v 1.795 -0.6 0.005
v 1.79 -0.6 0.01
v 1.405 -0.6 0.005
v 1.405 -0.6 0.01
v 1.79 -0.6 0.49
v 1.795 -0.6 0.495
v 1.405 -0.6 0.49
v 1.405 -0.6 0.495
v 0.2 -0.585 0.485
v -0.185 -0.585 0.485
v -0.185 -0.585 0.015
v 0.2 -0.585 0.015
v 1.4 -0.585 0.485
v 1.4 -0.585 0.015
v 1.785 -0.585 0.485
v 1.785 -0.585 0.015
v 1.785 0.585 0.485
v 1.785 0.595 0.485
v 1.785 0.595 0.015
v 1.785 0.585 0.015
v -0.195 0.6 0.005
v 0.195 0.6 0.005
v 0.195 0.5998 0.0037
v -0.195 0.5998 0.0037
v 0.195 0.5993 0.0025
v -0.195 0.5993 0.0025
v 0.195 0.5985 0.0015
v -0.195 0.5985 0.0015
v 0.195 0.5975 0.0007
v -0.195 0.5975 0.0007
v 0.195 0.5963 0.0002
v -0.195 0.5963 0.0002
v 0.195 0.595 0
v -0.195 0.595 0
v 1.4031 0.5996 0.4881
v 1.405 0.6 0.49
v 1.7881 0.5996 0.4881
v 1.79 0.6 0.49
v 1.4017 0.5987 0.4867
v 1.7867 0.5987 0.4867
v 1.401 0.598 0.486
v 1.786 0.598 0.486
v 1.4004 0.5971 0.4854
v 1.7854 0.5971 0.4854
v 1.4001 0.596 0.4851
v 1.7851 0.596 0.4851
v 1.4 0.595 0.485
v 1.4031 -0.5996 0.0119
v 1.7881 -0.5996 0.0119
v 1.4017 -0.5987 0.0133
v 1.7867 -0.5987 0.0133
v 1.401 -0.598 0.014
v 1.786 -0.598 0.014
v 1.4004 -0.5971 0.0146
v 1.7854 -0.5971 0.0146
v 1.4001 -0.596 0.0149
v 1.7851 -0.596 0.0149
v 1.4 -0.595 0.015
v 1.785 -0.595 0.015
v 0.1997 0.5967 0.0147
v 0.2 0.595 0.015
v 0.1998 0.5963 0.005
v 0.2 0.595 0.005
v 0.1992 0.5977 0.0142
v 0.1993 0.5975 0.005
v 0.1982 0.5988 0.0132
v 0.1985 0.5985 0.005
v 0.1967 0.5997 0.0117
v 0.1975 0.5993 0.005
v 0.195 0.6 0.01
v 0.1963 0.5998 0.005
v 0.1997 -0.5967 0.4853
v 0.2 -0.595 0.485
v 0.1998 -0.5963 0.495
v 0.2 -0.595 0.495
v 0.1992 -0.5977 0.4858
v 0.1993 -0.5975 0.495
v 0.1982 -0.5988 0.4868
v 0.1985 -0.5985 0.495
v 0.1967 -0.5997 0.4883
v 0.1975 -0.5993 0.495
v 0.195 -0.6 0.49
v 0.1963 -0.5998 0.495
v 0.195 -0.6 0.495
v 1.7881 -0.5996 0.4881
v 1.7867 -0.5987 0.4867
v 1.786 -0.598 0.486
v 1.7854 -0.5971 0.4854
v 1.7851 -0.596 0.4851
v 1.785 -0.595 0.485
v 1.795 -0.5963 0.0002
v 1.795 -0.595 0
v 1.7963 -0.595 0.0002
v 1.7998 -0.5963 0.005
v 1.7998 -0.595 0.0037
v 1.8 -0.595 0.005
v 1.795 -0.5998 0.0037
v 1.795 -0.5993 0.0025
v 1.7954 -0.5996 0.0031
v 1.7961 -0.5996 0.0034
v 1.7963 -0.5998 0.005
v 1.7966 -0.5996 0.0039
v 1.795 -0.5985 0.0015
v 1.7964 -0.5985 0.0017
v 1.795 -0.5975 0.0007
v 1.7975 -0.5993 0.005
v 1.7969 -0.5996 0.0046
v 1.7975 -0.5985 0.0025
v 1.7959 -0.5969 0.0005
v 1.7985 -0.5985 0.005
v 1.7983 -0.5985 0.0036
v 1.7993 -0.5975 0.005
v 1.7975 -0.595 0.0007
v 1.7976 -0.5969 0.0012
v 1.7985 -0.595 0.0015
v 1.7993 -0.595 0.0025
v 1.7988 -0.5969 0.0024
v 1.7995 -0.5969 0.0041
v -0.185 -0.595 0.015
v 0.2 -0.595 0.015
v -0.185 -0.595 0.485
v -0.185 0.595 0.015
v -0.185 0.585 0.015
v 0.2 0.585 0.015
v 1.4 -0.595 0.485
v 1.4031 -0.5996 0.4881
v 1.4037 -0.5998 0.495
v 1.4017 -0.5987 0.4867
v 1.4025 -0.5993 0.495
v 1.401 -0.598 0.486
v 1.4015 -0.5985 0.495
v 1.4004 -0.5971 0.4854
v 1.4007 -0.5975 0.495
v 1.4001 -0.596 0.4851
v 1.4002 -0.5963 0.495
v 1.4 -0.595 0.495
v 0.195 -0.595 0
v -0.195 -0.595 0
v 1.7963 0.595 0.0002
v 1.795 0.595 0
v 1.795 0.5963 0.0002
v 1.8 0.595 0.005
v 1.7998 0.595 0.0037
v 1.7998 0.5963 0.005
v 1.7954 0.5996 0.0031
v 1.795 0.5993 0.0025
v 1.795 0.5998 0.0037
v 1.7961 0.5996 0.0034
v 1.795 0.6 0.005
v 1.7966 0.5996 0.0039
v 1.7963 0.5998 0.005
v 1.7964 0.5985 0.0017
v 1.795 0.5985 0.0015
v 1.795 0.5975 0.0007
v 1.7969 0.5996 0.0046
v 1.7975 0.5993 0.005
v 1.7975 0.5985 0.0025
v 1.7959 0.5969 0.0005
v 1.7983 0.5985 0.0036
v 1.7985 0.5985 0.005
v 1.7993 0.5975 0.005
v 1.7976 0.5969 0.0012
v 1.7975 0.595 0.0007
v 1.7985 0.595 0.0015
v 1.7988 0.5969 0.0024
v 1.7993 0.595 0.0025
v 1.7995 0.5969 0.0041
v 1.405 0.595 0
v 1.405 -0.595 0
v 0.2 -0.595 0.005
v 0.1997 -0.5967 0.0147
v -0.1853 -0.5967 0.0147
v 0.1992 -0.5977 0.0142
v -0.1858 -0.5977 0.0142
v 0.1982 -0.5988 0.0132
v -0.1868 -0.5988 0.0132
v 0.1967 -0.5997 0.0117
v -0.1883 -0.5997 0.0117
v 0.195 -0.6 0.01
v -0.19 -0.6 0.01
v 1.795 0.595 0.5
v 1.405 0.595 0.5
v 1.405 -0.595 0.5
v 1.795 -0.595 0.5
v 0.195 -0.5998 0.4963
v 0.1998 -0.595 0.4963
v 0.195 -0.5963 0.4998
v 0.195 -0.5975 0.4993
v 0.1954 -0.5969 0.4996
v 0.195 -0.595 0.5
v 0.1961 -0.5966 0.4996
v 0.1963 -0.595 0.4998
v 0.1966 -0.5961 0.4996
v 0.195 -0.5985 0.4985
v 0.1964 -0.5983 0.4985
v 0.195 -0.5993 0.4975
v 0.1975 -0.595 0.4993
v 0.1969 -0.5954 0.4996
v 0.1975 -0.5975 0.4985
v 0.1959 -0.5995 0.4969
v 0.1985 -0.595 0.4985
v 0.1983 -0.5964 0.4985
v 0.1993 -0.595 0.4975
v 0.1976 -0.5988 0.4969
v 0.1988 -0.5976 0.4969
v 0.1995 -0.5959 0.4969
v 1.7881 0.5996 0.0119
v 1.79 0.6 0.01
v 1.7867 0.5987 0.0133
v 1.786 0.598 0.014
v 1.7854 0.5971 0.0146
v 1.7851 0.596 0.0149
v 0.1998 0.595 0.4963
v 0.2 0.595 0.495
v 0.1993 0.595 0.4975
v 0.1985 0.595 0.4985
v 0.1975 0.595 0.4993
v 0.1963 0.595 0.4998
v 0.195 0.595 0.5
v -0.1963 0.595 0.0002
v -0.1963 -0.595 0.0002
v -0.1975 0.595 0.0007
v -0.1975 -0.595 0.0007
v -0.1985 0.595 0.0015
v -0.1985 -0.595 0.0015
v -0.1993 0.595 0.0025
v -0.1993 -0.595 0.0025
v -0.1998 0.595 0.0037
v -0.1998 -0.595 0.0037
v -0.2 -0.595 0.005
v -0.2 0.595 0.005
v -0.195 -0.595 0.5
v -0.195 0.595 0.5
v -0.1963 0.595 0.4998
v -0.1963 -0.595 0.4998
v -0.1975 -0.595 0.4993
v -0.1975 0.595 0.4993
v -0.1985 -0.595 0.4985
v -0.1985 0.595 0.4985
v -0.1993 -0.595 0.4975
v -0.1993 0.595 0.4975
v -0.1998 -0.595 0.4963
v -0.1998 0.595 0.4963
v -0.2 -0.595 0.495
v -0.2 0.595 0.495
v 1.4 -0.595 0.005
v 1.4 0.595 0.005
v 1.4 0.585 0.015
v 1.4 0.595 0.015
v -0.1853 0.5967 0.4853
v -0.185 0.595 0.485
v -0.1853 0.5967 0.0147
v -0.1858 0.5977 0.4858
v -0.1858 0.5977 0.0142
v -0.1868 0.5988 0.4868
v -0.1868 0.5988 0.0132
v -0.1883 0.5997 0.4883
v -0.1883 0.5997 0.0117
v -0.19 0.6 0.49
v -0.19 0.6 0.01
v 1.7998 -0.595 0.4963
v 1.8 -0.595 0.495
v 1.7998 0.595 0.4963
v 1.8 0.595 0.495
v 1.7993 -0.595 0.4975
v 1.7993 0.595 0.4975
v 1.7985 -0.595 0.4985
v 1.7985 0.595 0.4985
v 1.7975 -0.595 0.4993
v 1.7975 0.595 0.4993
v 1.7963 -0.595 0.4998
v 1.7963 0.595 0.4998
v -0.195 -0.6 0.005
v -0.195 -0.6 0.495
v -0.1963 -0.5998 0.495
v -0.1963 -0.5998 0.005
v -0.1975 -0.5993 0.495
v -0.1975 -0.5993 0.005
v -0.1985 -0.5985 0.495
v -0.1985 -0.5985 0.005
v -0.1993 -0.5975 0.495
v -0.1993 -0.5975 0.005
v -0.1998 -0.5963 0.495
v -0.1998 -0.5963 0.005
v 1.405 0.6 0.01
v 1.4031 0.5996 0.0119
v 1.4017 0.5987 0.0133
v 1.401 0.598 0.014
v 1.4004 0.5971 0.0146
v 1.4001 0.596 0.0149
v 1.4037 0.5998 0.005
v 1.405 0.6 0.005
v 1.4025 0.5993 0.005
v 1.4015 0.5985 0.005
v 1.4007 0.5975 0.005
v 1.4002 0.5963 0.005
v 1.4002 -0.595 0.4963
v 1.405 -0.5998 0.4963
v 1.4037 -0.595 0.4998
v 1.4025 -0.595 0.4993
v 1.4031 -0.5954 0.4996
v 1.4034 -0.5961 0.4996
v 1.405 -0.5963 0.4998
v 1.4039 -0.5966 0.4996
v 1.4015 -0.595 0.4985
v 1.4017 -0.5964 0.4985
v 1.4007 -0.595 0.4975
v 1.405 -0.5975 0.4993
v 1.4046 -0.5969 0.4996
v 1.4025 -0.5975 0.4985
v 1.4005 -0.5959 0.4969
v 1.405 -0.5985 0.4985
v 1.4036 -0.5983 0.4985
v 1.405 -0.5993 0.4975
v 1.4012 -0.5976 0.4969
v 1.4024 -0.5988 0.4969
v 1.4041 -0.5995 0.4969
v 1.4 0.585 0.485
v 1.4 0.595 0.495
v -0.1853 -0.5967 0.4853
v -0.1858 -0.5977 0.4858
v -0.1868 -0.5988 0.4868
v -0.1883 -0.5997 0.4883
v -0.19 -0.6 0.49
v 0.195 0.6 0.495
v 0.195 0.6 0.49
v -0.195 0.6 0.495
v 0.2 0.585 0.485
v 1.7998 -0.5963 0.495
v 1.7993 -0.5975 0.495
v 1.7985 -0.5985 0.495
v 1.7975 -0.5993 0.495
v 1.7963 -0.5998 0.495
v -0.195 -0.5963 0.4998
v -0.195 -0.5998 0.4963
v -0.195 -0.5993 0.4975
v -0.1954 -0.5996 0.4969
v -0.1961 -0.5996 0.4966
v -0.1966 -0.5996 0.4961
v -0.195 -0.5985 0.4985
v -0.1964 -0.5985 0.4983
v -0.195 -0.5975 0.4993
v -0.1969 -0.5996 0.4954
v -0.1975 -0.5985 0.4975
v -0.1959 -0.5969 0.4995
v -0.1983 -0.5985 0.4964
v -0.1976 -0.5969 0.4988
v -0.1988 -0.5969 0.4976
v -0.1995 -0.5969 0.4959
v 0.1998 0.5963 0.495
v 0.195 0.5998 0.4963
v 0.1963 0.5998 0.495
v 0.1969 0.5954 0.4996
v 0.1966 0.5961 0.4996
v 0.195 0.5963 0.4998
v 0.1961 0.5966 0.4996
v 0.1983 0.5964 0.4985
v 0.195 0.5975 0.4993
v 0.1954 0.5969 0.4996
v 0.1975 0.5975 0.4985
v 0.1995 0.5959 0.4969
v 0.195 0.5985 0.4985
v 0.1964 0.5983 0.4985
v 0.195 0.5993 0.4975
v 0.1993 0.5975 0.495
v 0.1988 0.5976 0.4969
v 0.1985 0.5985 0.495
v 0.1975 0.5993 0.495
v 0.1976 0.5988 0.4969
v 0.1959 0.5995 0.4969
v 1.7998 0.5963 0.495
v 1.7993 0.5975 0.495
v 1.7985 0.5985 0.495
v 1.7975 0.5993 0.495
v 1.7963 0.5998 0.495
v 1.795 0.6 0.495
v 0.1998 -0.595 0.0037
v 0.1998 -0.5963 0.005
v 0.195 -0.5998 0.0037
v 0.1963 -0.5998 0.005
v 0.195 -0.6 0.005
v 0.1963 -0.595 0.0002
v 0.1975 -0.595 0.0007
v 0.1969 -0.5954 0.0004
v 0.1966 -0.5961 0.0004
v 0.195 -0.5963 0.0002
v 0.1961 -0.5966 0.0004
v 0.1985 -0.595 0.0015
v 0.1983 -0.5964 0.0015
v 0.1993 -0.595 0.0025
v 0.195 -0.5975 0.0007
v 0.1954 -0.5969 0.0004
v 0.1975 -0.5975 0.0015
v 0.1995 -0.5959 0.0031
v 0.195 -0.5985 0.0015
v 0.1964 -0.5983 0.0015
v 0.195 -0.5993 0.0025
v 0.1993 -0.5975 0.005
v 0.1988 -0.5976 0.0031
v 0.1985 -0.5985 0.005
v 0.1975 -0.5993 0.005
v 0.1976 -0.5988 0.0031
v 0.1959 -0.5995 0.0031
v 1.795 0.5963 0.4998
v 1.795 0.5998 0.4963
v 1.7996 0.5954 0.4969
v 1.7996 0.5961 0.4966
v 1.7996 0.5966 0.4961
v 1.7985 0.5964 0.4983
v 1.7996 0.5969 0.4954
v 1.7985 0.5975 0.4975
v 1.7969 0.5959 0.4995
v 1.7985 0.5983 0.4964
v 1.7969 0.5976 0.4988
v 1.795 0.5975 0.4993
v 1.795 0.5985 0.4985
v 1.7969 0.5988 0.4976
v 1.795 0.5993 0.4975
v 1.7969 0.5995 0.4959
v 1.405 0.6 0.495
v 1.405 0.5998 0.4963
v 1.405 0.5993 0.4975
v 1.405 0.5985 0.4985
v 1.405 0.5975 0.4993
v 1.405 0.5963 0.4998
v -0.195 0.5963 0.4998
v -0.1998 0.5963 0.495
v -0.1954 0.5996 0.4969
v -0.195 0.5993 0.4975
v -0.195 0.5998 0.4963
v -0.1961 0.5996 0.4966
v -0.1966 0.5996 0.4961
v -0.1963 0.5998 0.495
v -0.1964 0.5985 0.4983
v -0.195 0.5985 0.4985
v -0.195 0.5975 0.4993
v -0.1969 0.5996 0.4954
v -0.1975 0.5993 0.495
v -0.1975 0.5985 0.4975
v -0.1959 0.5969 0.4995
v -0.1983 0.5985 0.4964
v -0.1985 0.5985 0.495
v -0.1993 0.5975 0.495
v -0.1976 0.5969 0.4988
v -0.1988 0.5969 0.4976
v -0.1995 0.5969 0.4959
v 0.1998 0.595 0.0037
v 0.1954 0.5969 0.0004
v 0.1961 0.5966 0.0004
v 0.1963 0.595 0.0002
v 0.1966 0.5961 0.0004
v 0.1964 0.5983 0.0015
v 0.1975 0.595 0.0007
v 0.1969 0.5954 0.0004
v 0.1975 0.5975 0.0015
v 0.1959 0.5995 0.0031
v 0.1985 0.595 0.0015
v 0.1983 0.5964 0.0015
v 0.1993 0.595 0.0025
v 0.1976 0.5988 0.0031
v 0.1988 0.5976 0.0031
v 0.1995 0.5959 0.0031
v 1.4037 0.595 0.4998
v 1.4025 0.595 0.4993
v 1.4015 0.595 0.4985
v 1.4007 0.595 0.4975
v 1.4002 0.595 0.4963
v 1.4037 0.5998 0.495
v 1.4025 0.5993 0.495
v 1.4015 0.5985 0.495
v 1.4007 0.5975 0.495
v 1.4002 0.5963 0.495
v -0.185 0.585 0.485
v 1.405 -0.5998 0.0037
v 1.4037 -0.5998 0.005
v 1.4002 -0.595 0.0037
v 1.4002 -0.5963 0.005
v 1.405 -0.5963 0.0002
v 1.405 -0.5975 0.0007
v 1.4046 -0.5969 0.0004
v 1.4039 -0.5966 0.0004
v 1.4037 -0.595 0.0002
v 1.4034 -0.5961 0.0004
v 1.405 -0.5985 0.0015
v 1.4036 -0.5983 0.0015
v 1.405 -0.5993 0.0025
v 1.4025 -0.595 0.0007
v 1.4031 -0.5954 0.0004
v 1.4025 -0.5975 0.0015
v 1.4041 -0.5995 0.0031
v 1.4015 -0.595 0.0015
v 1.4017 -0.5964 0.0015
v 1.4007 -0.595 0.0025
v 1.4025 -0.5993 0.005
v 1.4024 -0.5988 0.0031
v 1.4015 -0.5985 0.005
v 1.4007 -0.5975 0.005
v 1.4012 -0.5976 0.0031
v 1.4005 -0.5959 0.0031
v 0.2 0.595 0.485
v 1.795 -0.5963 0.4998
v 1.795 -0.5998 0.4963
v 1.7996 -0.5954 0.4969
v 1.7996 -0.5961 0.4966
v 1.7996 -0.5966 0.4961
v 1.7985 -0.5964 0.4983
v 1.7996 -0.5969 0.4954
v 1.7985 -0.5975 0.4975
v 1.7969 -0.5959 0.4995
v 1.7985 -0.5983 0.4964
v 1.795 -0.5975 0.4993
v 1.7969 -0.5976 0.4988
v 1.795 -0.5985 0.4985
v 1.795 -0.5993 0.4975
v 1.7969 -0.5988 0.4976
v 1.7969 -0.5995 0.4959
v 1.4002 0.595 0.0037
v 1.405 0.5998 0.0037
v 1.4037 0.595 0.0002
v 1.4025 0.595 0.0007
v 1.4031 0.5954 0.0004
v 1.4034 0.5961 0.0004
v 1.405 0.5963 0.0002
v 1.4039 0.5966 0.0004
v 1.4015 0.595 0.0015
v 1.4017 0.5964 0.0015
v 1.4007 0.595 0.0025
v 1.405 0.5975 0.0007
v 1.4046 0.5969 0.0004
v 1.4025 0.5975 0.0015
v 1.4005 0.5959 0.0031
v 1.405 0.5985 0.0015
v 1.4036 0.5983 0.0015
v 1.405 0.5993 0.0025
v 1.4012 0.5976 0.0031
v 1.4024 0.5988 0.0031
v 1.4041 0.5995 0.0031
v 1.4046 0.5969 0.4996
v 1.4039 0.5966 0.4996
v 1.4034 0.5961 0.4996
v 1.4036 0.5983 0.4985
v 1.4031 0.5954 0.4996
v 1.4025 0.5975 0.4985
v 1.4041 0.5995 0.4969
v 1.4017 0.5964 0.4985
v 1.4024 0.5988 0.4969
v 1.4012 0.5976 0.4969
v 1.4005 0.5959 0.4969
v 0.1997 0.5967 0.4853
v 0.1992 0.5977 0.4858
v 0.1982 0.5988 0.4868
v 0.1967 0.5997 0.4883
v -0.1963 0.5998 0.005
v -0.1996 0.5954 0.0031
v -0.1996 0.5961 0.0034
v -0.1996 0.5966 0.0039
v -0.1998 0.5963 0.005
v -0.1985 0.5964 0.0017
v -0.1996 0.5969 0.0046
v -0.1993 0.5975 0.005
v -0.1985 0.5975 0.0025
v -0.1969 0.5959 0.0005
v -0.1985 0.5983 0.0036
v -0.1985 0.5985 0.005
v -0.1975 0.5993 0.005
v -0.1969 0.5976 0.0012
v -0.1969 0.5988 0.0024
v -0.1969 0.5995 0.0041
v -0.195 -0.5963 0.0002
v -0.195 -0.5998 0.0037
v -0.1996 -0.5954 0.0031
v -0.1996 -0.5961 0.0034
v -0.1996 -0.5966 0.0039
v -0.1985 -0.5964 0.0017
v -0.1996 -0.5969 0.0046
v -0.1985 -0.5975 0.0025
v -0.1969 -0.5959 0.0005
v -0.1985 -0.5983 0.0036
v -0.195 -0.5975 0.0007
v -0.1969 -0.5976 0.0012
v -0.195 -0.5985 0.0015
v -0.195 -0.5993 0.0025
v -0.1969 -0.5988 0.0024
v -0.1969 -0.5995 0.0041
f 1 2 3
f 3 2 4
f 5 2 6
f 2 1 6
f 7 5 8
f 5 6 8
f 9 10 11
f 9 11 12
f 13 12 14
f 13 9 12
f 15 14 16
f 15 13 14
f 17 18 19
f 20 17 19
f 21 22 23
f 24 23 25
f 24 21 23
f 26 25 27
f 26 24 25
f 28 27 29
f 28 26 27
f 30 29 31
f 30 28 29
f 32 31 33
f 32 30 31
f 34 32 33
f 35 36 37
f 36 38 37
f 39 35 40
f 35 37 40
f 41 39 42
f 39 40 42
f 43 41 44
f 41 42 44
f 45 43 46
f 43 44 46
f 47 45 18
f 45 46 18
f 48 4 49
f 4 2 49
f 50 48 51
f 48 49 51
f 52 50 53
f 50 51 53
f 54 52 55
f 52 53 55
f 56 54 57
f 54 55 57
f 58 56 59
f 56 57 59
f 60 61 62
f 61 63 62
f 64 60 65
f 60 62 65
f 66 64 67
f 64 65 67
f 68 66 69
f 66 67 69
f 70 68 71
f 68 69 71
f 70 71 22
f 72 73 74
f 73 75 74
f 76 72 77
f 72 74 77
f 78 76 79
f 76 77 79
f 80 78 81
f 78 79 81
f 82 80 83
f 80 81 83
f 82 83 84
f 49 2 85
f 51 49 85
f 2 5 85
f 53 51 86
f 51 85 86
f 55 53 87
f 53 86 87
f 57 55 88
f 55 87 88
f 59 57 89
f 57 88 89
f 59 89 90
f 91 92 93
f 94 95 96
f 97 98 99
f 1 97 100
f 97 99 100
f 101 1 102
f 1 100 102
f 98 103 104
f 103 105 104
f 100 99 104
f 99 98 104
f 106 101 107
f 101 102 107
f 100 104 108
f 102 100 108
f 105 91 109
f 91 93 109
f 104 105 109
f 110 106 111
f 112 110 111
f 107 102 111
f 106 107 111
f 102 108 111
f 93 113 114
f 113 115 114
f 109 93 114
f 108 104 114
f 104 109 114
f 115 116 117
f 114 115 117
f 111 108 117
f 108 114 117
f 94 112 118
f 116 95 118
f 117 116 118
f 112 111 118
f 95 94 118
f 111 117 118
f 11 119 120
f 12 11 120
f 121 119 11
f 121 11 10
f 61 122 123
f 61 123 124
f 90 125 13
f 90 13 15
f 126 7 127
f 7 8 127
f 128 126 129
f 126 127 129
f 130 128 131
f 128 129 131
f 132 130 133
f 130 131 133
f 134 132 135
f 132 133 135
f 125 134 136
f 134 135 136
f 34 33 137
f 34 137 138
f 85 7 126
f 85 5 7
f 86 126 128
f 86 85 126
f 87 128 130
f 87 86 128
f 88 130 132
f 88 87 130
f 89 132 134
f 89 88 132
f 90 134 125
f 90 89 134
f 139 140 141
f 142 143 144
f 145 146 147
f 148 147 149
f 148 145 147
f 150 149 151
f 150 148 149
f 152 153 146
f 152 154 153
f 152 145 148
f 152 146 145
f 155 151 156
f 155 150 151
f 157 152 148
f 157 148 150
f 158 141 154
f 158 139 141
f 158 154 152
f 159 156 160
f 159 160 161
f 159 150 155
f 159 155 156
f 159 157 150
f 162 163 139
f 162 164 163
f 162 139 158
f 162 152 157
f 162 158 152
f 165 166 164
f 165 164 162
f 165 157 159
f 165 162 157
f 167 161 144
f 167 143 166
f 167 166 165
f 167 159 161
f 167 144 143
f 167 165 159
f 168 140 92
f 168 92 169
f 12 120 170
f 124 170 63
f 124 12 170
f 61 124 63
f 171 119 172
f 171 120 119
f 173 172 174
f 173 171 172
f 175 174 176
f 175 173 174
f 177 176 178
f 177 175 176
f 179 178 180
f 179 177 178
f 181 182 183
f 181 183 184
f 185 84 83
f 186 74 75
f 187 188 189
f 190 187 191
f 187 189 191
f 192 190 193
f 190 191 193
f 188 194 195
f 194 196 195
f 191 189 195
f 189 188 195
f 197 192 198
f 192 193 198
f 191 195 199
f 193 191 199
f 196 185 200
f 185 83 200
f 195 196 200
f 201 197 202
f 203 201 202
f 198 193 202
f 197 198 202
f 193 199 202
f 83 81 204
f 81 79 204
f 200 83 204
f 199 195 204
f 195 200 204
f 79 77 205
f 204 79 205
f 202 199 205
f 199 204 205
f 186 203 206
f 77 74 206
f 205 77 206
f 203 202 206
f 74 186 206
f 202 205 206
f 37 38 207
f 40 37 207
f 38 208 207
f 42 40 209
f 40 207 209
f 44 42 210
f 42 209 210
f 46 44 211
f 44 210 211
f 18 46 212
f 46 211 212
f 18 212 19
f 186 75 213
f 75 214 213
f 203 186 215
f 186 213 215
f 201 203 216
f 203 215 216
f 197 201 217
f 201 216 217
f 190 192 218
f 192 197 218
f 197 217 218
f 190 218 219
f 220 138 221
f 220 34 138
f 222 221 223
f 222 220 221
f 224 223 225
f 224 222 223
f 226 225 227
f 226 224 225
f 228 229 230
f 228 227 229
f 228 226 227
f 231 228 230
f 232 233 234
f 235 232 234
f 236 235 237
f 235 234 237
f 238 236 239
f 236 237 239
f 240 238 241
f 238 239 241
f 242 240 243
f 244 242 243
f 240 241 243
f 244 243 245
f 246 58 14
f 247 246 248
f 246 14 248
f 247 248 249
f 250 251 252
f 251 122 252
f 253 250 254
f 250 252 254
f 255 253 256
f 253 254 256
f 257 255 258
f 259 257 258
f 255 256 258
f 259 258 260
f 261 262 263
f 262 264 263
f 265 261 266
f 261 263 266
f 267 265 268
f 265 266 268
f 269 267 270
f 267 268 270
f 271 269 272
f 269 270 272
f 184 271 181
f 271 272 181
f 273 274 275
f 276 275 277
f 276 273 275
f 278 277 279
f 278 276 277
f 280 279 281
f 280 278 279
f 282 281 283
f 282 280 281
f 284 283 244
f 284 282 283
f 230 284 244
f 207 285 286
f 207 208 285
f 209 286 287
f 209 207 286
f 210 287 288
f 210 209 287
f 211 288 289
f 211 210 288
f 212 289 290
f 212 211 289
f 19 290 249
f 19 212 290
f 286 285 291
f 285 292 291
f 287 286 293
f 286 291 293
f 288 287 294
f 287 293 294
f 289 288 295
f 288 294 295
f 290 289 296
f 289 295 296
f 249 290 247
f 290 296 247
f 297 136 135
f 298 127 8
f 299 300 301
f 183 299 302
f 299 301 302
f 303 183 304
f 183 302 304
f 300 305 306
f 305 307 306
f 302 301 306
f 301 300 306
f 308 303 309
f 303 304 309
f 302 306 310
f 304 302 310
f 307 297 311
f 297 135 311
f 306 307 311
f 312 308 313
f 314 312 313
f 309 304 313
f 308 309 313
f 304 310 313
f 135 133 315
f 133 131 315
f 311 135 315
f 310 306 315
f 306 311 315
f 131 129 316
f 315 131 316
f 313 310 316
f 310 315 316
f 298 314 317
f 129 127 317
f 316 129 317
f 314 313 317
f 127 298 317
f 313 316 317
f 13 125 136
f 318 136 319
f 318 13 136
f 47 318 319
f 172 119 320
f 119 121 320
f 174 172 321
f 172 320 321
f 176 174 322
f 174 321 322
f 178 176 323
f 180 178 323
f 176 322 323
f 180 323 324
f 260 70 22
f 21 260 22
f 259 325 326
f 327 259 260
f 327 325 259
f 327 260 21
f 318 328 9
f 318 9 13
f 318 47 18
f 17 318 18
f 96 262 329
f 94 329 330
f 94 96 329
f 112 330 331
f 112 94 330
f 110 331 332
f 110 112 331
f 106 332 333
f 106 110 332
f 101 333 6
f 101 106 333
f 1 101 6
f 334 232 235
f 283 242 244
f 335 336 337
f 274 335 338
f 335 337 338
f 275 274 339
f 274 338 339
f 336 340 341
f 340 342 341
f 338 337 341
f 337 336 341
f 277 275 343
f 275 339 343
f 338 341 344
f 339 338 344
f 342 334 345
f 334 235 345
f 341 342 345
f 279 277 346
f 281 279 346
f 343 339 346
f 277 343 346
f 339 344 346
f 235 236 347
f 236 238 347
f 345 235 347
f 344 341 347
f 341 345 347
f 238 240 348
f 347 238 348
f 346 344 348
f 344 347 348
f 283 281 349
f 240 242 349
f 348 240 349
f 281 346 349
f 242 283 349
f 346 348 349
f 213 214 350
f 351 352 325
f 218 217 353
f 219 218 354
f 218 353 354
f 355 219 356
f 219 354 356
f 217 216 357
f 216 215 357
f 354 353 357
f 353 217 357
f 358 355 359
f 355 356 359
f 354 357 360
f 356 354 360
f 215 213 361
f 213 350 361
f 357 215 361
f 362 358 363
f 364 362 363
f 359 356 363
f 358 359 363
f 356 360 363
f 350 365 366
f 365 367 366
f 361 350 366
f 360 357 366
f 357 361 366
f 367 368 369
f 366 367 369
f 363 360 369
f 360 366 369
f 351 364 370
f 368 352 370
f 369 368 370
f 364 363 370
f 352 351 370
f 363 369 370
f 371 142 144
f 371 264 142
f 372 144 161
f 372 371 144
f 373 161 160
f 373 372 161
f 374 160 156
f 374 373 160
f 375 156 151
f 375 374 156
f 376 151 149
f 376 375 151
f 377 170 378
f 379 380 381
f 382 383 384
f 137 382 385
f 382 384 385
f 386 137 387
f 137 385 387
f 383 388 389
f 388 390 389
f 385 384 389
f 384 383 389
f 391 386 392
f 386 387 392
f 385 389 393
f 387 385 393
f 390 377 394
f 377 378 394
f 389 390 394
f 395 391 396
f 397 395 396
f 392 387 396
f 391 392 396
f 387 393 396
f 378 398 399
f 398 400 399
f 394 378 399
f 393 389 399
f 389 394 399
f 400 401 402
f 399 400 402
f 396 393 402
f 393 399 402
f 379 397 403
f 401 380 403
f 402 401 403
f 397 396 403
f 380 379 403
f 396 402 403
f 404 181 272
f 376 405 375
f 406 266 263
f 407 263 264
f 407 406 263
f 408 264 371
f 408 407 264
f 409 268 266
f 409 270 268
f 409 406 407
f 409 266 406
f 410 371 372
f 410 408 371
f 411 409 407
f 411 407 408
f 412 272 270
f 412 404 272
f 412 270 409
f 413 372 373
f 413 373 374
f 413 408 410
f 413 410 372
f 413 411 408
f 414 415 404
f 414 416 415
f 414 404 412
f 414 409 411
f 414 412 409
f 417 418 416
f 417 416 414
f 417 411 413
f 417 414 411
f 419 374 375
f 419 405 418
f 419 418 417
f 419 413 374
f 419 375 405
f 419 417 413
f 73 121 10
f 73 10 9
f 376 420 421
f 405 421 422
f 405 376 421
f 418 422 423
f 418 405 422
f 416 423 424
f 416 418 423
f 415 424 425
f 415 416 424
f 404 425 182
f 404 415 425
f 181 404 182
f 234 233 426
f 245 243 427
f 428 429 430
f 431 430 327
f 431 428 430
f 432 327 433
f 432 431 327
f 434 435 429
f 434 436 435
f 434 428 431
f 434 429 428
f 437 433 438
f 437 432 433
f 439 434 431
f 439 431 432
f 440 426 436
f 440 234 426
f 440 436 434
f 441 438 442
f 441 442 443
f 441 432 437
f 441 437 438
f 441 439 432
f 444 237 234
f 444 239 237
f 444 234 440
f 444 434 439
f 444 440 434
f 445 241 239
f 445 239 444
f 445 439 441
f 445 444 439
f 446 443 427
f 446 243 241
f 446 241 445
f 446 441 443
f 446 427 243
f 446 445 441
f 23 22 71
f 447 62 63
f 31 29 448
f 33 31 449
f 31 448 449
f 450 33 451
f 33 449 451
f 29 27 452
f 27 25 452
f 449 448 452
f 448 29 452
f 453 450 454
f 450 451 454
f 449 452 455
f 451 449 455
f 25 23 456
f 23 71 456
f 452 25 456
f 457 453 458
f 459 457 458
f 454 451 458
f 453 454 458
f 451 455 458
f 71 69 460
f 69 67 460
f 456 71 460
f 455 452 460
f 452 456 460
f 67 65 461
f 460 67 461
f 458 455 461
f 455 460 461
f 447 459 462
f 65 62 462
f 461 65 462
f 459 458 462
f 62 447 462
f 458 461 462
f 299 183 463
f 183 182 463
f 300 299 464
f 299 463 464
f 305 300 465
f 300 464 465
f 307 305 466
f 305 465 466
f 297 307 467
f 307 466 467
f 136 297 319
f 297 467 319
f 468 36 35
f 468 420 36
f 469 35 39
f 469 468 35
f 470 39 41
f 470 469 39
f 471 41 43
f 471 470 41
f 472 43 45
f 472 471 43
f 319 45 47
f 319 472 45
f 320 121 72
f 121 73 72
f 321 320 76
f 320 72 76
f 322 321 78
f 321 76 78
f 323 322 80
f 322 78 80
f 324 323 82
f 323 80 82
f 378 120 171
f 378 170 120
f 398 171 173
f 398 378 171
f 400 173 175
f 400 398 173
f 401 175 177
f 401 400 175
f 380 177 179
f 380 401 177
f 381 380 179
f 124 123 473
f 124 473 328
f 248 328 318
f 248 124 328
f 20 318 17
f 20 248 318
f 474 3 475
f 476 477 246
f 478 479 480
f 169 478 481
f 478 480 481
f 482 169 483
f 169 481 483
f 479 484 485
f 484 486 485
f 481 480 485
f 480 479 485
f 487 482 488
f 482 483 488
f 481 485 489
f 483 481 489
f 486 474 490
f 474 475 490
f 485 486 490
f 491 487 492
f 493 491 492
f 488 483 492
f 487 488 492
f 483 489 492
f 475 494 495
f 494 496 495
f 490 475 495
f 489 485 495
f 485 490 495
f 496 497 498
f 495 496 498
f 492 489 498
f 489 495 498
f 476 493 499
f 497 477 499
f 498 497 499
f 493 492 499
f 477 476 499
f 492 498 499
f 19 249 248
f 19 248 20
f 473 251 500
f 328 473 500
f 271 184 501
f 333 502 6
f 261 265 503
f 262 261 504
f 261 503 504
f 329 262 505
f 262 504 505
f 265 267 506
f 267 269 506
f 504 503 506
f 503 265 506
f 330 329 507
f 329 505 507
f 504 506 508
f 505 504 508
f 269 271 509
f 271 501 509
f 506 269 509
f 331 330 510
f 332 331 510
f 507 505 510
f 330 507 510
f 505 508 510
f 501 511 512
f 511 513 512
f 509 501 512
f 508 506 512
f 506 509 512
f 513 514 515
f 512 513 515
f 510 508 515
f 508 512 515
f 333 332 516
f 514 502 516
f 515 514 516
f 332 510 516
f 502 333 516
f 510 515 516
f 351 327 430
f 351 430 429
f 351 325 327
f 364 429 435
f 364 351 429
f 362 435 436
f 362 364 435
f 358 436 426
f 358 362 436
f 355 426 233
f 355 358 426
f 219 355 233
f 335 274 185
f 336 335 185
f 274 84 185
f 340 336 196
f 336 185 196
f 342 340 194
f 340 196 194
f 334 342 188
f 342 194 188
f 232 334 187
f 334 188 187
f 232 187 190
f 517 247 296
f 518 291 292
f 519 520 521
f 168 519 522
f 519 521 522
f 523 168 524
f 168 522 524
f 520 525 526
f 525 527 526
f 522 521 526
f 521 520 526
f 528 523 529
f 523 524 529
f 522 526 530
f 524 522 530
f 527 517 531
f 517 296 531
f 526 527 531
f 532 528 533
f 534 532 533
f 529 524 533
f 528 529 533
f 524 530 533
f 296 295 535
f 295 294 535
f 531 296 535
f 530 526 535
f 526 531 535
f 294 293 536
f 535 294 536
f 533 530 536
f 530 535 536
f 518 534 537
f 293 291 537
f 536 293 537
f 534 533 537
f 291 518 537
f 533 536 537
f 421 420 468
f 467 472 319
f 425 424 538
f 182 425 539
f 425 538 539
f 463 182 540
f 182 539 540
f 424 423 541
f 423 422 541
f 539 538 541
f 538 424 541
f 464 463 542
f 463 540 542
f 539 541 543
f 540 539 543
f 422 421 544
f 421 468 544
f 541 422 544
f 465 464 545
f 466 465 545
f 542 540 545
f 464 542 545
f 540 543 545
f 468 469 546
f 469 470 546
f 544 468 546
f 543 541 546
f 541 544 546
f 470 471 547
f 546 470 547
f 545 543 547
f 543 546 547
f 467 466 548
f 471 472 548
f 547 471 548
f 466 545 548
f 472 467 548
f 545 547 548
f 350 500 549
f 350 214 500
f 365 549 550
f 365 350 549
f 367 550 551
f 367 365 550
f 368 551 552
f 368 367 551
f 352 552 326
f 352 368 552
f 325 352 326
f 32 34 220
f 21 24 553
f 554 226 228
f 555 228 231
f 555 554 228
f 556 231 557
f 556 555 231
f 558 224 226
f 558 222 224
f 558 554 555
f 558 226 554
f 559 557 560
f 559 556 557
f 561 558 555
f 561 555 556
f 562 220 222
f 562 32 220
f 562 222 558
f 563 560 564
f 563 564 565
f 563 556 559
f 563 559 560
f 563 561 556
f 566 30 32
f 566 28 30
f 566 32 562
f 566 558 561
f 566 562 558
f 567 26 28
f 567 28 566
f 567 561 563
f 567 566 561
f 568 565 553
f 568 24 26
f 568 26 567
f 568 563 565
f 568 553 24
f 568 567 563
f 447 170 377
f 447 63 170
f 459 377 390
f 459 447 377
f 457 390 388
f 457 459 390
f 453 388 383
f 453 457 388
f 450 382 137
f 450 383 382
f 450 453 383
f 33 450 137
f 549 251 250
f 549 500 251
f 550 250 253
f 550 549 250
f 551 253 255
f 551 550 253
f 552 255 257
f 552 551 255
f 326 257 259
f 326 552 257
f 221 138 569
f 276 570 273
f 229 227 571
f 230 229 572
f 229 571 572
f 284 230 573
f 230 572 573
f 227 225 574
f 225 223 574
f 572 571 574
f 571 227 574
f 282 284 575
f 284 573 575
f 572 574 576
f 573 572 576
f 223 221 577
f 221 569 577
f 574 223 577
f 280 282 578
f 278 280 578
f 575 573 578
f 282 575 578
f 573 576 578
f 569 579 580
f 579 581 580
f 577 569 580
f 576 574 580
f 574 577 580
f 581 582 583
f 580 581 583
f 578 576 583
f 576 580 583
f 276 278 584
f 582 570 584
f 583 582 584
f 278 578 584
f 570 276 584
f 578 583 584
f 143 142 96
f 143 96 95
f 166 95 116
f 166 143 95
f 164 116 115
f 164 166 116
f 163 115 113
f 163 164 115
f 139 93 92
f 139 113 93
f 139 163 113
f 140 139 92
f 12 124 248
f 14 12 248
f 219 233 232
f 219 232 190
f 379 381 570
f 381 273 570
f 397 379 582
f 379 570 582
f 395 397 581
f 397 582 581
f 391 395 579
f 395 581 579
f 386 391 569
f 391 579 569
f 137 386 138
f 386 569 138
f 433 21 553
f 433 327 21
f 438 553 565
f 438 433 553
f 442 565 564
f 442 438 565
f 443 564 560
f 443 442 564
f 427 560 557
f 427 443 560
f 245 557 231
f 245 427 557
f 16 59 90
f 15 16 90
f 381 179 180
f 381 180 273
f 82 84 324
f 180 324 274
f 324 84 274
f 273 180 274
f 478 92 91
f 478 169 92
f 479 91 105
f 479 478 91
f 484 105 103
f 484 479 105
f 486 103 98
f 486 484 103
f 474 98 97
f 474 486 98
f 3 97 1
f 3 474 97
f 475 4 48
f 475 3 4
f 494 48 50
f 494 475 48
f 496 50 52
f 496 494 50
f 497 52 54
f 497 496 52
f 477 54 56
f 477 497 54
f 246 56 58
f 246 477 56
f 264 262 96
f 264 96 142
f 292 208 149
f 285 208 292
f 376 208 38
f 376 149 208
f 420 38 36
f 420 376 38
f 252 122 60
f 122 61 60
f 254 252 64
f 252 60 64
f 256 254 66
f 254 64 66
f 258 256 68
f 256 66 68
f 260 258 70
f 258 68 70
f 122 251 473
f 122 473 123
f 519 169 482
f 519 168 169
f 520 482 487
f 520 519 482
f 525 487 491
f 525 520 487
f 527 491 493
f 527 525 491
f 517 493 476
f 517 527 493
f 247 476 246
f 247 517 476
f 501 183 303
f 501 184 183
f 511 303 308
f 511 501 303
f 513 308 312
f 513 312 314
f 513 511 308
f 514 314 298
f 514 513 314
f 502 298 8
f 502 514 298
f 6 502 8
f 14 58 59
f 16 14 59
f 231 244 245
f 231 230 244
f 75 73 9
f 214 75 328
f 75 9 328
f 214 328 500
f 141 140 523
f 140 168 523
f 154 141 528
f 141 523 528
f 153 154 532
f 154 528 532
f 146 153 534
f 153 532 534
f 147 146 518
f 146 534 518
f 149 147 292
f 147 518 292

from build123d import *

# Parameters (mm, degrees)
SKETCH_1_W          = 2
SKETCH_1_H          = 1.2
EXTRUDE_1_DEPTH     = 0.47
SKETCH_2_W          = 0.4
SKETCH_2_H          = 1.2
EXTRUDE_2_DEPTH     = 0.015
SKETCH_3_W          = 0.4
SKETCH_3_H          = 1.2
EXTRUDE_3_DEPTH     = 0.015
SKETCH_4_W          = 1.97
SKETCH_4_H          = 0.47
CUT_EXTRUDE_1_DEPTH = 0.015
SKETCH_5_W          = 1.97
SKETCH_5_H          = 0.47
CUT_EXTRUDE_2_DEPTH = 0.015
FILLET_1_R          = 0.005


with BuildPart() as part:
    # Эскиз1 → Бобышка-Вытянуть1 (new body)
    with BuildSketch(Plane.XY):
        Rectangle(SKETCH_1_W, SKETCH_1_H)
    extrude(amount=EXTRUDE_1_DEPTH)

    # Эскиз2 → Бобышка-Вытянуть2 (add)
    with BuildSketch(Plane.XY.offset(0.47)):
        with Locations((-0.8, 0)):
            Rectangle(SKETCH_2_W, SKETCH_2_H)
        with Locations((0.8, 0)):
            Rectangle(SKETCH_2_W, SKETCH_2_H)
    extrude(amount=EXTRUDE_2_DEPTH)

    # Эскиз3 → Бобышка-Вытянуть3 (add)
    with BuildSketch(Plane(origin=(0, 0, 0), x_dir=(-1, 0, 0), z_dir=(0, 0, -1))):
        with Locations((-0.8, 0)):
            Rectangle(SKETCH_3_W, SKETCH_3_H)
        with Locations((0.8, 0)):
            Rectangle(SKETCH_3_W, SKETCH_3_H)
    extrude(amount=EXTRUDE_3_DEPTH)

    # Эскиз4 → Вырез-Вытянуть1 (cut)
    with BuildSketch(Plane.XZ.offset(0.6)):
        with Locations((0, 0.235)):
            Rectangle(SKETCH_4_W, SKETCH_4_H)
    extrude(amount=-CUT_EXTRUDE_1_DEPTH, mode=Mode.SUBTRACT)

    # Эскиз5 → Вырез-Вытянуть2 (cut)
    with BuildSketch(Plane(origin=(0, 0.6, 0), x_dir=(1, 0, 0), z_dir=(0, 1, 0))):
        with Locations((0, -0.235)):
            Rectangle(SKETCH_5_W, SKETCH_5_H)
    extrude(amount=-CUT_EXTRUDE_2_DEPTH, mode=Mode.SUBTRACT)

    # Скругление1
    fillet_1_edges = [part.edges().sort_by_distance(p)[0] for p in [
        (0.985, 0.6, 0.235),
        (0.7925, 0.6, 0),
        (-0.7925, 0.6, 0),
        (-0.985, 0.6, 0.235),
        (-0.7925, 0.6, 0.47),
        (0.7925, 0.6, 0.47),
        (-0.6, -0.6, 0.4775),
        (-0.6, 0.6, 0.4775),
        (-1, 0, 0.485),
        (-0.8, -0.6, 0.485),
        (-0.6, 0, 0.485),
        (-0.8, 0.6, 0.485),
        (0.6, 0.6, 0.4775),
        (0.6, -0.6, 0.4775),
        (0.8, 0.6, 0.485),
        (0.6, 0, 0.485),
        (0.8, -0.6, 0.485),
        (1, 0, 0.485),
        (0.6, -0.6, -0.0075),
        (0.6, 0.6, -0.0075),
        (1, 0, -0.015),
        (0.8, -0.6, -0.015),
        (0.6, 0, -0.015),
        (0.8, 0.6, -0.015),
        (-0.6, 0.6, -0.0075),
        (-0.6, -0.6, -0.0075),
        (-0.8, 0.6, -0.015),
        (-0.6, 0, -0.015),
        (-0.8, -0.6, -0.015),
        (-1, 0, -0.015),
        (1, -0.6, 0.235),
        (-1, -0.6, 0.235),
        (0.985, -0.6, 0.235),
        (0.7925, -0.6, 0.47),
        (-1, 0.6, 0.235),
        (-0.7925, -0.6, 0.47),
        (-0.985, -0.6, 0.235),
        (-0.7925, -0.6, 0),
        (1, 0.6, 0.235),
        (0.7925, -0.6, 0),
    ]]
    fillet(fillet_1_edges, radius=FILLET_1_R)


with BuildPart() as part_1:
    # Move Body 2: read off the stored shape, not the designer's step
    # Move Body 2: moved
    add(part.part.moved(Location((0.8, 0, 0.015))))


solid = part_1.part
